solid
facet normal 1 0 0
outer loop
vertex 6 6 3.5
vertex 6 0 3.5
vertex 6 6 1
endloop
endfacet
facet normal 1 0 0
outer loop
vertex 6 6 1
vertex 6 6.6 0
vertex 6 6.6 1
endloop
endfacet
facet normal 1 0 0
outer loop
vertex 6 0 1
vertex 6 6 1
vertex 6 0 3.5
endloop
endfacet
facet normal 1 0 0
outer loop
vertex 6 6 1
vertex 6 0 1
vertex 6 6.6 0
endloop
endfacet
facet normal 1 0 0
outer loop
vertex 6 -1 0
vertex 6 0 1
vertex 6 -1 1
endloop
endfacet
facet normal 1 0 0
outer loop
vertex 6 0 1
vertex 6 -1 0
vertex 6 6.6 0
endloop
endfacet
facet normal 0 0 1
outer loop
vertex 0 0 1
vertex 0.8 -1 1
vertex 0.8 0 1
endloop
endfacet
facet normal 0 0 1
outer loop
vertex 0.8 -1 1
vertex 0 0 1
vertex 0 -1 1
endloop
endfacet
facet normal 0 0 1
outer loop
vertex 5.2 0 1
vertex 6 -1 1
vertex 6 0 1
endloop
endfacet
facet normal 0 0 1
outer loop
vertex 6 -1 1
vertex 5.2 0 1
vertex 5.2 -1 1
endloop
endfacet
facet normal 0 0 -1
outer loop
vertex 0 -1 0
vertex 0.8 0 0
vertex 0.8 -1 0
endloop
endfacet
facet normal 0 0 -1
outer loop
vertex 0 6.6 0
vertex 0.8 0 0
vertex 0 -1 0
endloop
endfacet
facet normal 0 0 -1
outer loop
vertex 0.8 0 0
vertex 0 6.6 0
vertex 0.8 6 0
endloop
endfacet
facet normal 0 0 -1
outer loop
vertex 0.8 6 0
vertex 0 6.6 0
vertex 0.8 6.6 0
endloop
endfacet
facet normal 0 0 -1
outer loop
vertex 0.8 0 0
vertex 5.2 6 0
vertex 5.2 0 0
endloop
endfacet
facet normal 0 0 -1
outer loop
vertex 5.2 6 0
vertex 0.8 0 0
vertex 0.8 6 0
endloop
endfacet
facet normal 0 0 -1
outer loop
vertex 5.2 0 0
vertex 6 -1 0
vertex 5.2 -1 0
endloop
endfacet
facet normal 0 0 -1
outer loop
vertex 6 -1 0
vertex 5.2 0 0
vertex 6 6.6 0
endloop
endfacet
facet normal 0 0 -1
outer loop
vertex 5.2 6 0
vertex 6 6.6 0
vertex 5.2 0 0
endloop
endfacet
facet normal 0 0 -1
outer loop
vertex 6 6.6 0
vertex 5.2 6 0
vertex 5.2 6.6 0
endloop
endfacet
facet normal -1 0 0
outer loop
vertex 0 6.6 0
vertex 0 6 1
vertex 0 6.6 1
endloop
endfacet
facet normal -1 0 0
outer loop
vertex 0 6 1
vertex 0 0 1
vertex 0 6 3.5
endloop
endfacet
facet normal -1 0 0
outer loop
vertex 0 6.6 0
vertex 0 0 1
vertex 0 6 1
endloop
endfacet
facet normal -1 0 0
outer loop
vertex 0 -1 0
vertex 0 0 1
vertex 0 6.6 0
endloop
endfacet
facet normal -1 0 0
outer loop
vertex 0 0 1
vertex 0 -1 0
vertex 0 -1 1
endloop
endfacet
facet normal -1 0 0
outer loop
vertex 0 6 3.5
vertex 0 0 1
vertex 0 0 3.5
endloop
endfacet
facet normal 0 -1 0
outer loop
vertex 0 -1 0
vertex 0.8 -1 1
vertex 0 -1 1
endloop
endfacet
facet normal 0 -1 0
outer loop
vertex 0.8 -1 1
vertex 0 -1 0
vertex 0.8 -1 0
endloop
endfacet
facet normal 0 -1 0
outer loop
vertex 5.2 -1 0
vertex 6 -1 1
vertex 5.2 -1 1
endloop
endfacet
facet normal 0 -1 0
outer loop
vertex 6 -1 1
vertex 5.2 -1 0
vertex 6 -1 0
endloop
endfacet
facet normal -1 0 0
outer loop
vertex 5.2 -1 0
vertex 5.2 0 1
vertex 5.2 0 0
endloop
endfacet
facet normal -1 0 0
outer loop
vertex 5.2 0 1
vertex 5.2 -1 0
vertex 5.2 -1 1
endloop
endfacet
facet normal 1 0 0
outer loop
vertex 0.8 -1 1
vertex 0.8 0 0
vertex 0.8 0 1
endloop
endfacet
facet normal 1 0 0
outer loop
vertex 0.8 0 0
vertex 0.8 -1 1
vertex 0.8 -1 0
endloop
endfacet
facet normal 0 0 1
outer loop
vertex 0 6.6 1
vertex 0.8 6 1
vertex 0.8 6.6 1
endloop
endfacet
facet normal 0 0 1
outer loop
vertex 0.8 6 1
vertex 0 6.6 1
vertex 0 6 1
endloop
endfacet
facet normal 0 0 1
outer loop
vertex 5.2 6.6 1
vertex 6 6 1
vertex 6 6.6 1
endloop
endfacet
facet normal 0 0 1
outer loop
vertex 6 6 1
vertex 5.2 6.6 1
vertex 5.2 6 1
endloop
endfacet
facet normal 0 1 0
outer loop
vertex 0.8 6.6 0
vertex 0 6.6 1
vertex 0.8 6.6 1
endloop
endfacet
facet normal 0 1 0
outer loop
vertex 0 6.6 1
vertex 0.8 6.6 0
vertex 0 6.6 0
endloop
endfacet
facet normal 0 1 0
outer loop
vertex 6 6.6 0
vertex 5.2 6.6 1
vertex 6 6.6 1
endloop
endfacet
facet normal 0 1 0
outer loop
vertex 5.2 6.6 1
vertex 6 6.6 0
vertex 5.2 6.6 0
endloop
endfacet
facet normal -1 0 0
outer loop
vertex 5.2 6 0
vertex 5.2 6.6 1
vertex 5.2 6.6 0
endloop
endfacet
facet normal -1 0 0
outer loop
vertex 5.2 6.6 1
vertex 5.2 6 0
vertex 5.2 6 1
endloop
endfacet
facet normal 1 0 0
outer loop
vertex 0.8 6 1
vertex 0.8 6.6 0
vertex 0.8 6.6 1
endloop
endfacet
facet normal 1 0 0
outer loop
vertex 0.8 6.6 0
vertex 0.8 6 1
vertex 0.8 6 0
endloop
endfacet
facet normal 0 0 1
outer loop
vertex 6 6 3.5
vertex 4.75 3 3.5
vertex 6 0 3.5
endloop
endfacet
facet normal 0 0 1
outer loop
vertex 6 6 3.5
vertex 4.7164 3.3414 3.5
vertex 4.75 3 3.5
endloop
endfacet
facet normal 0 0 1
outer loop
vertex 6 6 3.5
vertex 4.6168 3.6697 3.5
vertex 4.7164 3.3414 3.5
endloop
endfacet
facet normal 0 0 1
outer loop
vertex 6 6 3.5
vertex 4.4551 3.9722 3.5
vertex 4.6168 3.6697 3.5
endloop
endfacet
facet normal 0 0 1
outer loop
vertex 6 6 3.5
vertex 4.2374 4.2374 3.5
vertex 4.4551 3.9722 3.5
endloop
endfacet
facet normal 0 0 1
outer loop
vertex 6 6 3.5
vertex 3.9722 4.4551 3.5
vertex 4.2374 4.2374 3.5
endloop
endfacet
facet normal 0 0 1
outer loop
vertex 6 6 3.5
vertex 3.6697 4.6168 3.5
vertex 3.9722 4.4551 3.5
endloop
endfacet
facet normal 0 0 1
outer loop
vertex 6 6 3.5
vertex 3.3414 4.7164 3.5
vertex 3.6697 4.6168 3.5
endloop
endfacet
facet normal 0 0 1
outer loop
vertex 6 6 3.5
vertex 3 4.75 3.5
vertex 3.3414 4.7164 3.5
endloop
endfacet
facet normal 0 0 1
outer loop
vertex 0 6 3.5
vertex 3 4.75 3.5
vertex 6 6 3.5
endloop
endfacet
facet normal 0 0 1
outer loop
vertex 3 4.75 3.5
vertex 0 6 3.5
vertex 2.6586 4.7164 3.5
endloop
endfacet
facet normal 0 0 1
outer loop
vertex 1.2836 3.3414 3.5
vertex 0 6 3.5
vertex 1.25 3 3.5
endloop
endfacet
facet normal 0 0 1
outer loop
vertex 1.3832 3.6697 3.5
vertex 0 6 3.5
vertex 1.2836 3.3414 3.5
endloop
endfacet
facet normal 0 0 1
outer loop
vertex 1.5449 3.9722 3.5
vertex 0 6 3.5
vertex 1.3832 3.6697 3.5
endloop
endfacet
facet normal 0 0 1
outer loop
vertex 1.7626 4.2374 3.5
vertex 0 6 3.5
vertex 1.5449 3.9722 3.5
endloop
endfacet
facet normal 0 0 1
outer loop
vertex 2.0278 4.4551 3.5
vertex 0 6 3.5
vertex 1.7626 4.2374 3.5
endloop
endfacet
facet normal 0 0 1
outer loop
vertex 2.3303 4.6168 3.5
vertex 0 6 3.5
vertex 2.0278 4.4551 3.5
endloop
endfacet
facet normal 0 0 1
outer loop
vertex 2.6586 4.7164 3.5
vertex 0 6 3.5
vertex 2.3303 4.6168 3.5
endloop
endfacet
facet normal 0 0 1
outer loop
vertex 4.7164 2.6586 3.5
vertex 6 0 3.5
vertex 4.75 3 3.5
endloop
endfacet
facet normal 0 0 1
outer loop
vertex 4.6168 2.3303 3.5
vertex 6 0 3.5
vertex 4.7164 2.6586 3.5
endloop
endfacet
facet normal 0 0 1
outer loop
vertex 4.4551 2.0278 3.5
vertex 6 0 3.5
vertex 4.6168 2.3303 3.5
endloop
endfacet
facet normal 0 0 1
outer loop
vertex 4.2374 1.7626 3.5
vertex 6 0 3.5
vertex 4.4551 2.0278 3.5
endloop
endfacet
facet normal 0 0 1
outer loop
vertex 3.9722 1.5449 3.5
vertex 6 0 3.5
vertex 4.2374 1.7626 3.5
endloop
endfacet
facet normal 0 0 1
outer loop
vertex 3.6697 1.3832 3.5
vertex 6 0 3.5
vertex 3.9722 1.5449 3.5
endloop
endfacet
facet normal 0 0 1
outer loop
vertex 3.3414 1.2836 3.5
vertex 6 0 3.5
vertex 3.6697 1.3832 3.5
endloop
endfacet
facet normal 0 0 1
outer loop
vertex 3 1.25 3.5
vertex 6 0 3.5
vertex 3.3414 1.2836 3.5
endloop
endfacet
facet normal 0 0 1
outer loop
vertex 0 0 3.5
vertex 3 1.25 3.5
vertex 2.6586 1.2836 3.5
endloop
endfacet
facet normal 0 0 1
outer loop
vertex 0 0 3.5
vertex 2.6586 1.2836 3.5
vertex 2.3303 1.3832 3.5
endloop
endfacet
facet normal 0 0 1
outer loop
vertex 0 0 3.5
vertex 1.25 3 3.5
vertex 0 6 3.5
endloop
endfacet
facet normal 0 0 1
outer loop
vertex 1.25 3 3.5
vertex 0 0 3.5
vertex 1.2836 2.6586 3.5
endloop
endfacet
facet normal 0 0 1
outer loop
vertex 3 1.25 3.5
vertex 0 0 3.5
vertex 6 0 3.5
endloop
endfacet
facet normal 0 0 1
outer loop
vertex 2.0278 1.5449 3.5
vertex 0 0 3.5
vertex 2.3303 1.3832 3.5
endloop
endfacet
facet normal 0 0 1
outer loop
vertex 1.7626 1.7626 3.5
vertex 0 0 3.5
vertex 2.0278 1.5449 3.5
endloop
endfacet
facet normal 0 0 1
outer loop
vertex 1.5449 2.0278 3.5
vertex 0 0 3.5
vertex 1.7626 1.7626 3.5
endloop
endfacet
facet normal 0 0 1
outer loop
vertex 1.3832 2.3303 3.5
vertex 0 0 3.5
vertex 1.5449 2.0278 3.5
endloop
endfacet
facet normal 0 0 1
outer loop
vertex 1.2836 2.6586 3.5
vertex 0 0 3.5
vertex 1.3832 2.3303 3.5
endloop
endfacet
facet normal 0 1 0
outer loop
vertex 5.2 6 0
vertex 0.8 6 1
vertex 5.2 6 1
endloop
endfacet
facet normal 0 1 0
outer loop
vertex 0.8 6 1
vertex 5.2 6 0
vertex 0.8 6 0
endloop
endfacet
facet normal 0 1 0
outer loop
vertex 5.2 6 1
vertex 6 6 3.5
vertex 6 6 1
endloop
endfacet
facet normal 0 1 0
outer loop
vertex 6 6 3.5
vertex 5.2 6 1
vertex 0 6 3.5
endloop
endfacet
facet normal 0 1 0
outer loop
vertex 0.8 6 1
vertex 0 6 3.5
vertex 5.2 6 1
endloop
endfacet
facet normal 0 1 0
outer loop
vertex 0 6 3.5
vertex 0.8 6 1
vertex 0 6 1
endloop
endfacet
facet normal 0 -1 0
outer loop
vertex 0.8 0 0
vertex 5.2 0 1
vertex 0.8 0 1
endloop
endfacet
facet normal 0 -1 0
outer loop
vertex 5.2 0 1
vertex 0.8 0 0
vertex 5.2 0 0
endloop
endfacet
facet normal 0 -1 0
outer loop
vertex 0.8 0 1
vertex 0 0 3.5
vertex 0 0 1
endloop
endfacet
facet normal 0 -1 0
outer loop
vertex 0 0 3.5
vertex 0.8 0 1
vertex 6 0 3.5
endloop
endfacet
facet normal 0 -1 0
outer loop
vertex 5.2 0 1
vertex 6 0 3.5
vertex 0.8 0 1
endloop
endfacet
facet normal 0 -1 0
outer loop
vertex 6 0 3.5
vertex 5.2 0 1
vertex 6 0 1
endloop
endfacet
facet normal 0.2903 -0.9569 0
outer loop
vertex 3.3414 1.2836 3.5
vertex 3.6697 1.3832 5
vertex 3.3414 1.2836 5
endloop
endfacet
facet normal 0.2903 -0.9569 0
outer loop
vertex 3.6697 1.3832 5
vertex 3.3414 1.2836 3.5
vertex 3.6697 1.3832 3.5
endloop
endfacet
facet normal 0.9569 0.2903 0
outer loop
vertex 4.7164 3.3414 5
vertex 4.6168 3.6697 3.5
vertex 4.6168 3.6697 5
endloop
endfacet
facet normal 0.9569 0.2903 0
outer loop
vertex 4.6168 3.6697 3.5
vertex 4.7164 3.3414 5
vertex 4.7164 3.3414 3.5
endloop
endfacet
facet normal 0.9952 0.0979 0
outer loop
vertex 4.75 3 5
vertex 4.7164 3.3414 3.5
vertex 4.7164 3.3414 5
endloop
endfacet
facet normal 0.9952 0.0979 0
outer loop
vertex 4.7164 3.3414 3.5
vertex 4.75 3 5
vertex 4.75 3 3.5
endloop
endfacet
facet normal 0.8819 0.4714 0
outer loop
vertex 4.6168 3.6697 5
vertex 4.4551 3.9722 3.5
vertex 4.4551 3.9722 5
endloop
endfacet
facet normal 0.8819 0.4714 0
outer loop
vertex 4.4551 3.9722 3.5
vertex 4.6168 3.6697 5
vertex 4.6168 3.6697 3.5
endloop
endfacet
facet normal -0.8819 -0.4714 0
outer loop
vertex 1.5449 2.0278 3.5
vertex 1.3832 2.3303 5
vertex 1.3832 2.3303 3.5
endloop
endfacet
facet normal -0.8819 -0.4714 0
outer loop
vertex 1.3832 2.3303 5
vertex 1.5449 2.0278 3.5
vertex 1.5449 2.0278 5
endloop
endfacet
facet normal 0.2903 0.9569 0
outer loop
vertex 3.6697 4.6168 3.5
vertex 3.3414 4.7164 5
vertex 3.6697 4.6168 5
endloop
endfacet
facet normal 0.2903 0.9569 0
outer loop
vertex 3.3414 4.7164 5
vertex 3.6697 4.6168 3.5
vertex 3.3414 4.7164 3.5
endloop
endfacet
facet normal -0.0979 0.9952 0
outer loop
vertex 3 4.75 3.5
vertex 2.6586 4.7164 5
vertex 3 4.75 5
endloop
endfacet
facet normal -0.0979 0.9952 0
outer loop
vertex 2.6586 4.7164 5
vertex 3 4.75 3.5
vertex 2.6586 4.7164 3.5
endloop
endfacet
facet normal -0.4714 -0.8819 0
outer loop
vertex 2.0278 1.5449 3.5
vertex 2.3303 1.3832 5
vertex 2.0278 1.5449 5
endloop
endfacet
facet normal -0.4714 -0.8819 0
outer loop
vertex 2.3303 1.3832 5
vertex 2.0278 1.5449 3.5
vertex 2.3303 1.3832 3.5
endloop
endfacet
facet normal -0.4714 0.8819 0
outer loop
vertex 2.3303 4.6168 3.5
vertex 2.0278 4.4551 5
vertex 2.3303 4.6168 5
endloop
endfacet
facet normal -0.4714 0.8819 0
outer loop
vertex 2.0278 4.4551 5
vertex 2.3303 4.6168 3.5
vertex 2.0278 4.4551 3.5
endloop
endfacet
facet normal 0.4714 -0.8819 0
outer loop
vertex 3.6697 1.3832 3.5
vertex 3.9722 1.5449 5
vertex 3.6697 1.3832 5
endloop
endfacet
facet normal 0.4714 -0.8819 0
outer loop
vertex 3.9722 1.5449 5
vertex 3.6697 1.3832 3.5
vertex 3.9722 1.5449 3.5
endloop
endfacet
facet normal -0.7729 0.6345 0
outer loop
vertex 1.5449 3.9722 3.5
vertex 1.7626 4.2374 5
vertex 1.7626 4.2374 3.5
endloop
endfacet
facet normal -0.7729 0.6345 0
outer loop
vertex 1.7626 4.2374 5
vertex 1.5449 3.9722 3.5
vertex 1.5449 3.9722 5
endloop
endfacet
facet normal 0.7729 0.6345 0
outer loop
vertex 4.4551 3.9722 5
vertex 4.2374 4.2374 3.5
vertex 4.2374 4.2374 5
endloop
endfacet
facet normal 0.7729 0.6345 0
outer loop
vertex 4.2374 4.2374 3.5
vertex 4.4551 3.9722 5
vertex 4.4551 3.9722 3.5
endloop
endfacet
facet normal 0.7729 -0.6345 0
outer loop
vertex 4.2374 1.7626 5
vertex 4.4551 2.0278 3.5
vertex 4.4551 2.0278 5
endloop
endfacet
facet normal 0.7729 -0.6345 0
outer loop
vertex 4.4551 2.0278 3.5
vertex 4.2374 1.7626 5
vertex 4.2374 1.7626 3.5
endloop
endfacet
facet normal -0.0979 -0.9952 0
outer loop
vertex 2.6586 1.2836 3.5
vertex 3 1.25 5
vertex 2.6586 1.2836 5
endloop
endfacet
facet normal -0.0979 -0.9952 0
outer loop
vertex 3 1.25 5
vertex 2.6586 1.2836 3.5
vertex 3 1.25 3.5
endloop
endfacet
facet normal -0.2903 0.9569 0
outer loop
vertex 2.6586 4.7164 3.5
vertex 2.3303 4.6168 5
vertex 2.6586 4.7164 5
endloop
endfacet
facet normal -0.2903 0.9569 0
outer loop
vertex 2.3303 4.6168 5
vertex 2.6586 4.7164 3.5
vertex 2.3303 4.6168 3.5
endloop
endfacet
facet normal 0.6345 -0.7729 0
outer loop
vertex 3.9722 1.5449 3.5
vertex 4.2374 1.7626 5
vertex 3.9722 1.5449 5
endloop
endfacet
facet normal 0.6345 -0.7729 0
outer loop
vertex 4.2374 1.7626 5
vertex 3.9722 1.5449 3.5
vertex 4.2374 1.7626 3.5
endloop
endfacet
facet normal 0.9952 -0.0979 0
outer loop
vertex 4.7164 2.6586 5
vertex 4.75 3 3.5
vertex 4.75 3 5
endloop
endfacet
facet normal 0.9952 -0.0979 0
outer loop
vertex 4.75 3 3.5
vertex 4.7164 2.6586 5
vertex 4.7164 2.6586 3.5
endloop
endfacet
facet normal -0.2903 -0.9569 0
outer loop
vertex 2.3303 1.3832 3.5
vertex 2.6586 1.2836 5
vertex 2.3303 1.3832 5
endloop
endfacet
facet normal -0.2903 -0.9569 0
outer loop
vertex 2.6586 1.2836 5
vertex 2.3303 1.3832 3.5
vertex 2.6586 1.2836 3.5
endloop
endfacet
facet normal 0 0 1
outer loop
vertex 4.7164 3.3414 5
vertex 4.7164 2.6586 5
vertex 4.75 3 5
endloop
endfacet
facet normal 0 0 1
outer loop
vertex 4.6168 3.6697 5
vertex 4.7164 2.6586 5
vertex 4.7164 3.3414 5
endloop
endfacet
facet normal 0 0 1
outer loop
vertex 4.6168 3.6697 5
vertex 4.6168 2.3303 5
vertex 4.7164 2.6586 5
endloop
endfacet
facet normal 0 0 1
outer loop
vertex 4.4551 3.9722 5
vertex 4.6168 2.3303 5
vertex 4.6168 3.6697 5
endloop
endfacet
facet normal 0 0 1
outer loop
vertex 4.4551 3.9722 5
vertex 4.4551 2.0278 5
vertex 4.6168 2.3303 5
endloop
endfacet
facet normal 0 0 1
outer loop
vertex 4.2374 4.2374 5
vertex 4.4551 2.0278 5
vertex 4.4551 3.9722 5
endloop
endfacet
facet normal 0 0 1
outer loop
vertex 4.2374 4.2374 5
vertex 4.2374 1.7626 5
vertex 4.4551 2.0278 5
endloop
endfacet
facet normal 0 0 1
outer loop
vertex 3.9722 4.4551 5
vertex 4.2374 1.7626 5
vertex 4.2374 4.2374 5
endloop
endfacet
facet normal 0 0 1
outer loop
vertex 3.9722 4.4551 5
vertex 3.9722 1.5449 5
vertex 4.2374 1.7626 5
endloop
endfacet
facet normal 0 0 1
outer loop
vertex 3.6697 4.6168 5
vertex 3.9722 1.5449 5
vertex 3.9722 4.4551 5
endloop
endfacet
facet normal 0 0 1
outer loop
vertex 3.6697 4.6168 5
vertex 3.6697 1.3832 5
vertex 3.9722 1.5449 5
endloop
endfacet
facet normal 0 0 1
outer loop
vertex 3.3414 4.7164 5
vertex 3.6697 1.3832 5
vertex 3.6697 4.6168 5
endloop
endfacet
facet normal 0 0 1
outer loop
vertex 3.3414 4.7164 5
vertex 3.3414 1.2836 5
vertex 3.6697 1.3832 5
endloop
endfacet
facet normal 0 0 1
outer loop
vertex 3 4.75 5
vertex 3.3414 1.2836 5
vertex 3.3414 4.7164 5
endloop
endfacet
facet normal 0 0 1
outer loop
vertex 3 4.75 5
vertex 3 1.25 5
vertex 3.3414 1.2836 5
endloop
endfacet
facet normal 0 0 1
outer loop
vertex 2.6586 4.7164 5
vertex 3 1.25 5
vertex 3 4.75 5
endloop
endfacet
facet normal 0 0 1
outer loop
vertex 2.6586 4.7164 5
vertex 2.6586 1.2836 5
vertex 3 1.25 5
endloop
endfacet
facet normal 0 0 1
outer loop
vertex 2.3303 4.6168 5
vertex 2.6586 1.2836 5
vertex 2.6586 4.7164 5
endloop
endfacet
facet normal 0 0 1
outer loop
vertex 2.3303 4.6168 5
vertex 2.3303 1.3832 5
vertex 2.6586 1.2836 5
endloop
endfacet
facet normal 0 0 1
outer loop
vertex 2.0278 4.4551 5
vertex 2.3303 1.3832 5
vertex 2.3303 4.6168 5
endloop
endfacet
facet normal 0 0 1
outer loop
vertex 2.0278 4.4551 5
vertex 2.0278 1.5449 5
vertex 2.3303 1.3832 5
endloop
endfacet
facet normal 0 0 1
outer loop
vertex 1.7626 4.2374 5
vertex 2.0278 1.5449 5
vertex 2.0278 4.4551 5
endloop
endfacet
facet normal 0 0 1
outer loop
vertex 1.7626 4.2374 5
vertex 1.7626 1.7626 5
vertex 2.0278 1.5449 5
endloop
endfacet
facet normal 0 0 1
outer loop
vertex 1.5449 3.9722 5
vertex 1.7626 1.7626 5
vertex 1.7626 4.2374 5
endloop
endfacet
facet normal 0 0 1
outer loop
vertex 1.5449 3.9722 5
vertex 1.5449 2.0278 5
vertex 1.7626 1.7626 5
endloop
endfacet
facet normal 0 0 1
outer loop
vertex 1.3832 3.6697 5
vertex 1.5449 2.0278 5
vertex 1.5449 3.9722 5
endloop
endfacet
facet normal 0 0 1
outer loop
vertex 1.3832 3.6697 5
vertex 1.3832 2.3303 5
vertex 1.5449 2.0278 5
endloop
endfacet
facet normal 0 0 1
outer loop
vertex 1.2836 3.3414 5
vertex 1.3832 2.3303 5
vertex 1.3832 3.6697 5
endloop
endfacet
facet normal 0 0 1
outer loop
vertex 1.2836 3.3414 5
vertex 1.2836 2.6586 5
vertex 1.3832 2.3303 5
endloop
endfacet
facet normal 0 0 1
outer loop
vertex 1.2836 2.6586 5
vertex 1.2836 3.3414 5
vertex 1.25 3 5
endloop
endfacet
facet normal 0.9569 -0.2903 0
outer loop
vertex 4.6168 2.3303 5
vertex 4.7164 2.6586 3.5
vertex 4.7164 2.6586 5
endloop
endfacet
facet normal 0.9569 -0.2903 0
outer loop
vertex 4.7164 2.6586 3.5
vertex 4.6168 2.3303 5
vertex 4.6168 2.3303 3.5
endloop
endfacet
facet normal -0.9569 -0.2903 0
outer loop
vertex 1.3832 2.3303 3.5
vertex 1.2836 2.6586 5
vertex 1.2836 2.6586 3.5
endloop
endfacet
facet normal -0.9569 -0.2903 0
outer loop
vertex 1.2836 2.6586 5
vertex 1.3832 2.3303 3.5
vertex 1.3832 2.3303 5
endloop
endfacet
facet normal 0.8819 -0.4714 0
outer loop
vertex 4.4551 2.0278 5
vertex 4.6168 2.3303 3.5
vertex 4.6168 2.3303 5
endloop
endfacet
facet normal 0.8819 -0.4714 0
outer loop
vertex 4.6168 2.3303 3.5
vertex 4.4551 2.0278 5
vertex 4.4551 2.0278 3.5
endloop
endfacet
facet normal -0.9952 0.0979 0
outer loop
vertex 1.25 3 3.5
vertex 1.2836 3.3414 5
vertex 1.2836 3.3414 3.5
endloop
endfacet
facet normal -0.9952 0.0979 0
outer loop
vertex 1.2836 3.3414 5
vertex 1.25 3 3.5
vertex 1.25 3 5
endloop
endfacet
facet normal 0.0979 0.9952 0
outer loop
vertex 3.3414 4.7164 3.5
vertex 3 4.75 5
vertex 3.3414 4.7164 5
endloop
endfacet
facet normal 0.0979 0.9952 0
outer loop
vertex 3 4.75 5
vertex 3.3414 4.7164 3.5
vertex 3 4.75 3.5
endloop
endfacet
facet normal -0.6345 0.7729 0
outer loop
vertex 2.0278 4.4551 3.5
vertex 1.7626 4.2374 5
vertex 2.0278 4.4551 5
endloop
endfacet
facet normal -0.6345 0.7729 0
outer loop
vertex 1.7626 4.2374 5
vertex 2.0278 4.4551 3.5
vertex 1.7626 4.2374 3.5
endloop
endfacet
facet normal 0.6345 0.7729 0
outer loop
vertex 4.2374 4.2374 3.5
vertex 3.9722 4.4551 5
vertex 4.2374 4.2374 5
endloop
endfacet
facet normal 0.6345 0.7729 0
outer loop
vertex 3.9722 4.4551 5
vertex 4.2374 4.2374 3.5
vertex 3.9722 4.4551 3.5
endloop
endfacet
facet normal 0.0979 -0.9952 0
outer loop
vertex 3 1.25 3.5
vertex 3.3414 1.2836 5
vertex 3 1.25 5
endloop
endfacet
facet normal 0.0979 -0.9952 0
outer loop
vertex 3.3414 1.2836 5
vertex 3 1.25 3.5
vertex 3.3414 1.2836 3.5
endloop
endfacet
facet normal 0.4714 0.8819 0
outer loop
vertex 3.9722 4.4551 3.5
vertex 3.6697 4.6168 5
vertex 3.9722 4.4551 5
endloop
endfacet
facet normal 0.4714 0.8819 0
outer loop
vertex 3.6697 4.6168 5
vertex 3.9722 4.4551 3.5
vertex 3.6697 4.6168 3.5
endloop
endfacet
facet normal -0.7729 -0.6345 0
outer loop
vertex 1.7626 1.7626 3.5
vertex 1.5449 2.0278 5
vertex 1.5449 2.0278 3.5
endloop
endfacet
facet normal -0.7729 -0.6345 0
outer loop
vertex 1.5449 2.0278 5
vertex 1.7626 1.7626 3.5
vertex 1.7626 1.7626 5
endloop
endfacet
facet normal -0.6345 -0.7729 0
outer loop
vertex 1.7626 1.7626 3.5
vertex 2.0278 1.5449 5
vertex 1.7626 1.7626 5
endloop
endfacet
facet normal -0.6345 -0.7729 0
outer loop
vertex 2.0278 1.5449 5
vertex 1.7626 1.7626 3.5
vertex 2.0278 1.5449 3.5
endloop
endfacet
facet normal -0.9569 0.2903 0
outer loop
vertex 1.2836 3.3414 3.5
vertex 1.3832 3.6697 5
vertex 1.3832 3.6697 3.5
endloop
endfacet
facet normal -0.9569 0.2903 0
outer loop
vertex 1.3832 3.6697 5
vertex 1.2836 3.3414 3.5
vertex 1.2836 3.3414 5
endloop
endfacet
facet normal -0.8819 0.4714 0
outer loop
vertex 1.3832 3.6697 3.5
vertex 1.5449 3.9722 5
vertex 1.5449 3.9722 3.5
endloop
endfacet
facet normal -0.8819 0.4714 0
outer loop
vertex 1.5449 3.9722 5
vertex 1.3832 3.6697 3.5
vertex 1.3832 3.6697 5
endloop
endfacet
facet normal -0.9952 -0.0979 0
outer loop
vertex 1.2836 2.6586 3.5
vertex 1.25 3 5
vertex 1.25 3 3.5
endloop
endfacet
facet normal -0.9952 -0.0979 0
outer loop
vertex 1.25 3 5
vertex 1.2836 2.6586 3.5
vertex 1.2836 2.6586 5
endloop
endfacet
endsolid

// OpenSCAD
// file: button_vars.scad
/*
 *  "Planter" is a device that control a houseplant's water and light schedules.
 *  Copyright (C) 2018  Jon Sangster
 *
 *  This program is free software: you can redistribute it and/or modify it
 *  under the terms of the GNU General Public License as published by the Free
 *  Software Foundation, either version 3 of the License, or (at your option)
 *  any later version.
 *
 *  This program is distributed in the hope that it will be useful, but WITHOUT
 *  ANY WARRANTY; without even the implied warranty of MERCHANTABILITY or
 *  FITNESS FOR A PARTICULAR PURPOSE.  See the GNU General Public License for
 *  more details.
 *
 *  You should have received a copy of the GNU General Public License along
 *  with this program.  If not, see <https://www.gnu.org/licenses/>.
 */
button_base_w = 6;
button_base_z = 3.5;

button_d = 3.5;
button_h = 1.5;

button_pin_w = 0.8;
button_pin_z = 1;
// main file
/*
 *  "Planter" is a device that control a houseplant's water and light schedules.
 *  Copyright (C) 2018  Jon Sangster
 *
 *  This program is free software: you can redistribute it and/or modify it
 *  under the terms of the GNU General Public License as published by the Free
 *  Software Foundation, either version 3 of the License, or (at your option)
 *  any later version.
 *
 *  This program is distributed in the hope that it will be useful, but WITHOUT
 *  ANY WARRANTY; without even the implied warranty of MERCHANTABILITY or
 *  FITNESS FOR A PARTICULAR PURPOSE.  See the GNU General Public License for
 *  more details.
 *
 *  You should have received a copy of the GNU General Public License along
 *  with this program.  If not, see <https://www.gnu.org/licenses/>.
 */
include <button_vars.scad>;

module button_pin()
{
    difference() {
        cube([button_base_w, button_pin_w*2, button_pin_z]);
        translate([button_pin_w, -1, -1]) {
            cube([button_base_w - button_pin_w*2, button_pin_w+2.1, button_pin_z+2]);
        }
    }
}

module _button()
{
    // Base
    color("MediumPurple") cube([button_base_w, button_base_w, button_base_z]);

    // Button
    translate([button_base_w/2, button_base_w/2, button_base_z-1]) {
        color("DarkSlateGray") cylinder(d = button_d, h = button_h+1, $fn=32);
    }

    color("Gold") {
        translate([0, -1, 0]) {
            button_pin();
            translate([0, button_base_w, 0]) button_pin();
        }
    }
}

module button(part = "positive")
{
    if (part == "negative") {
        translate([0, 0, -button_base_z * 2]) {
            cube([button_base_w, button_base_w, button_base_z * 4]);
        }
    } else {
        _button();
    }
}

button();
